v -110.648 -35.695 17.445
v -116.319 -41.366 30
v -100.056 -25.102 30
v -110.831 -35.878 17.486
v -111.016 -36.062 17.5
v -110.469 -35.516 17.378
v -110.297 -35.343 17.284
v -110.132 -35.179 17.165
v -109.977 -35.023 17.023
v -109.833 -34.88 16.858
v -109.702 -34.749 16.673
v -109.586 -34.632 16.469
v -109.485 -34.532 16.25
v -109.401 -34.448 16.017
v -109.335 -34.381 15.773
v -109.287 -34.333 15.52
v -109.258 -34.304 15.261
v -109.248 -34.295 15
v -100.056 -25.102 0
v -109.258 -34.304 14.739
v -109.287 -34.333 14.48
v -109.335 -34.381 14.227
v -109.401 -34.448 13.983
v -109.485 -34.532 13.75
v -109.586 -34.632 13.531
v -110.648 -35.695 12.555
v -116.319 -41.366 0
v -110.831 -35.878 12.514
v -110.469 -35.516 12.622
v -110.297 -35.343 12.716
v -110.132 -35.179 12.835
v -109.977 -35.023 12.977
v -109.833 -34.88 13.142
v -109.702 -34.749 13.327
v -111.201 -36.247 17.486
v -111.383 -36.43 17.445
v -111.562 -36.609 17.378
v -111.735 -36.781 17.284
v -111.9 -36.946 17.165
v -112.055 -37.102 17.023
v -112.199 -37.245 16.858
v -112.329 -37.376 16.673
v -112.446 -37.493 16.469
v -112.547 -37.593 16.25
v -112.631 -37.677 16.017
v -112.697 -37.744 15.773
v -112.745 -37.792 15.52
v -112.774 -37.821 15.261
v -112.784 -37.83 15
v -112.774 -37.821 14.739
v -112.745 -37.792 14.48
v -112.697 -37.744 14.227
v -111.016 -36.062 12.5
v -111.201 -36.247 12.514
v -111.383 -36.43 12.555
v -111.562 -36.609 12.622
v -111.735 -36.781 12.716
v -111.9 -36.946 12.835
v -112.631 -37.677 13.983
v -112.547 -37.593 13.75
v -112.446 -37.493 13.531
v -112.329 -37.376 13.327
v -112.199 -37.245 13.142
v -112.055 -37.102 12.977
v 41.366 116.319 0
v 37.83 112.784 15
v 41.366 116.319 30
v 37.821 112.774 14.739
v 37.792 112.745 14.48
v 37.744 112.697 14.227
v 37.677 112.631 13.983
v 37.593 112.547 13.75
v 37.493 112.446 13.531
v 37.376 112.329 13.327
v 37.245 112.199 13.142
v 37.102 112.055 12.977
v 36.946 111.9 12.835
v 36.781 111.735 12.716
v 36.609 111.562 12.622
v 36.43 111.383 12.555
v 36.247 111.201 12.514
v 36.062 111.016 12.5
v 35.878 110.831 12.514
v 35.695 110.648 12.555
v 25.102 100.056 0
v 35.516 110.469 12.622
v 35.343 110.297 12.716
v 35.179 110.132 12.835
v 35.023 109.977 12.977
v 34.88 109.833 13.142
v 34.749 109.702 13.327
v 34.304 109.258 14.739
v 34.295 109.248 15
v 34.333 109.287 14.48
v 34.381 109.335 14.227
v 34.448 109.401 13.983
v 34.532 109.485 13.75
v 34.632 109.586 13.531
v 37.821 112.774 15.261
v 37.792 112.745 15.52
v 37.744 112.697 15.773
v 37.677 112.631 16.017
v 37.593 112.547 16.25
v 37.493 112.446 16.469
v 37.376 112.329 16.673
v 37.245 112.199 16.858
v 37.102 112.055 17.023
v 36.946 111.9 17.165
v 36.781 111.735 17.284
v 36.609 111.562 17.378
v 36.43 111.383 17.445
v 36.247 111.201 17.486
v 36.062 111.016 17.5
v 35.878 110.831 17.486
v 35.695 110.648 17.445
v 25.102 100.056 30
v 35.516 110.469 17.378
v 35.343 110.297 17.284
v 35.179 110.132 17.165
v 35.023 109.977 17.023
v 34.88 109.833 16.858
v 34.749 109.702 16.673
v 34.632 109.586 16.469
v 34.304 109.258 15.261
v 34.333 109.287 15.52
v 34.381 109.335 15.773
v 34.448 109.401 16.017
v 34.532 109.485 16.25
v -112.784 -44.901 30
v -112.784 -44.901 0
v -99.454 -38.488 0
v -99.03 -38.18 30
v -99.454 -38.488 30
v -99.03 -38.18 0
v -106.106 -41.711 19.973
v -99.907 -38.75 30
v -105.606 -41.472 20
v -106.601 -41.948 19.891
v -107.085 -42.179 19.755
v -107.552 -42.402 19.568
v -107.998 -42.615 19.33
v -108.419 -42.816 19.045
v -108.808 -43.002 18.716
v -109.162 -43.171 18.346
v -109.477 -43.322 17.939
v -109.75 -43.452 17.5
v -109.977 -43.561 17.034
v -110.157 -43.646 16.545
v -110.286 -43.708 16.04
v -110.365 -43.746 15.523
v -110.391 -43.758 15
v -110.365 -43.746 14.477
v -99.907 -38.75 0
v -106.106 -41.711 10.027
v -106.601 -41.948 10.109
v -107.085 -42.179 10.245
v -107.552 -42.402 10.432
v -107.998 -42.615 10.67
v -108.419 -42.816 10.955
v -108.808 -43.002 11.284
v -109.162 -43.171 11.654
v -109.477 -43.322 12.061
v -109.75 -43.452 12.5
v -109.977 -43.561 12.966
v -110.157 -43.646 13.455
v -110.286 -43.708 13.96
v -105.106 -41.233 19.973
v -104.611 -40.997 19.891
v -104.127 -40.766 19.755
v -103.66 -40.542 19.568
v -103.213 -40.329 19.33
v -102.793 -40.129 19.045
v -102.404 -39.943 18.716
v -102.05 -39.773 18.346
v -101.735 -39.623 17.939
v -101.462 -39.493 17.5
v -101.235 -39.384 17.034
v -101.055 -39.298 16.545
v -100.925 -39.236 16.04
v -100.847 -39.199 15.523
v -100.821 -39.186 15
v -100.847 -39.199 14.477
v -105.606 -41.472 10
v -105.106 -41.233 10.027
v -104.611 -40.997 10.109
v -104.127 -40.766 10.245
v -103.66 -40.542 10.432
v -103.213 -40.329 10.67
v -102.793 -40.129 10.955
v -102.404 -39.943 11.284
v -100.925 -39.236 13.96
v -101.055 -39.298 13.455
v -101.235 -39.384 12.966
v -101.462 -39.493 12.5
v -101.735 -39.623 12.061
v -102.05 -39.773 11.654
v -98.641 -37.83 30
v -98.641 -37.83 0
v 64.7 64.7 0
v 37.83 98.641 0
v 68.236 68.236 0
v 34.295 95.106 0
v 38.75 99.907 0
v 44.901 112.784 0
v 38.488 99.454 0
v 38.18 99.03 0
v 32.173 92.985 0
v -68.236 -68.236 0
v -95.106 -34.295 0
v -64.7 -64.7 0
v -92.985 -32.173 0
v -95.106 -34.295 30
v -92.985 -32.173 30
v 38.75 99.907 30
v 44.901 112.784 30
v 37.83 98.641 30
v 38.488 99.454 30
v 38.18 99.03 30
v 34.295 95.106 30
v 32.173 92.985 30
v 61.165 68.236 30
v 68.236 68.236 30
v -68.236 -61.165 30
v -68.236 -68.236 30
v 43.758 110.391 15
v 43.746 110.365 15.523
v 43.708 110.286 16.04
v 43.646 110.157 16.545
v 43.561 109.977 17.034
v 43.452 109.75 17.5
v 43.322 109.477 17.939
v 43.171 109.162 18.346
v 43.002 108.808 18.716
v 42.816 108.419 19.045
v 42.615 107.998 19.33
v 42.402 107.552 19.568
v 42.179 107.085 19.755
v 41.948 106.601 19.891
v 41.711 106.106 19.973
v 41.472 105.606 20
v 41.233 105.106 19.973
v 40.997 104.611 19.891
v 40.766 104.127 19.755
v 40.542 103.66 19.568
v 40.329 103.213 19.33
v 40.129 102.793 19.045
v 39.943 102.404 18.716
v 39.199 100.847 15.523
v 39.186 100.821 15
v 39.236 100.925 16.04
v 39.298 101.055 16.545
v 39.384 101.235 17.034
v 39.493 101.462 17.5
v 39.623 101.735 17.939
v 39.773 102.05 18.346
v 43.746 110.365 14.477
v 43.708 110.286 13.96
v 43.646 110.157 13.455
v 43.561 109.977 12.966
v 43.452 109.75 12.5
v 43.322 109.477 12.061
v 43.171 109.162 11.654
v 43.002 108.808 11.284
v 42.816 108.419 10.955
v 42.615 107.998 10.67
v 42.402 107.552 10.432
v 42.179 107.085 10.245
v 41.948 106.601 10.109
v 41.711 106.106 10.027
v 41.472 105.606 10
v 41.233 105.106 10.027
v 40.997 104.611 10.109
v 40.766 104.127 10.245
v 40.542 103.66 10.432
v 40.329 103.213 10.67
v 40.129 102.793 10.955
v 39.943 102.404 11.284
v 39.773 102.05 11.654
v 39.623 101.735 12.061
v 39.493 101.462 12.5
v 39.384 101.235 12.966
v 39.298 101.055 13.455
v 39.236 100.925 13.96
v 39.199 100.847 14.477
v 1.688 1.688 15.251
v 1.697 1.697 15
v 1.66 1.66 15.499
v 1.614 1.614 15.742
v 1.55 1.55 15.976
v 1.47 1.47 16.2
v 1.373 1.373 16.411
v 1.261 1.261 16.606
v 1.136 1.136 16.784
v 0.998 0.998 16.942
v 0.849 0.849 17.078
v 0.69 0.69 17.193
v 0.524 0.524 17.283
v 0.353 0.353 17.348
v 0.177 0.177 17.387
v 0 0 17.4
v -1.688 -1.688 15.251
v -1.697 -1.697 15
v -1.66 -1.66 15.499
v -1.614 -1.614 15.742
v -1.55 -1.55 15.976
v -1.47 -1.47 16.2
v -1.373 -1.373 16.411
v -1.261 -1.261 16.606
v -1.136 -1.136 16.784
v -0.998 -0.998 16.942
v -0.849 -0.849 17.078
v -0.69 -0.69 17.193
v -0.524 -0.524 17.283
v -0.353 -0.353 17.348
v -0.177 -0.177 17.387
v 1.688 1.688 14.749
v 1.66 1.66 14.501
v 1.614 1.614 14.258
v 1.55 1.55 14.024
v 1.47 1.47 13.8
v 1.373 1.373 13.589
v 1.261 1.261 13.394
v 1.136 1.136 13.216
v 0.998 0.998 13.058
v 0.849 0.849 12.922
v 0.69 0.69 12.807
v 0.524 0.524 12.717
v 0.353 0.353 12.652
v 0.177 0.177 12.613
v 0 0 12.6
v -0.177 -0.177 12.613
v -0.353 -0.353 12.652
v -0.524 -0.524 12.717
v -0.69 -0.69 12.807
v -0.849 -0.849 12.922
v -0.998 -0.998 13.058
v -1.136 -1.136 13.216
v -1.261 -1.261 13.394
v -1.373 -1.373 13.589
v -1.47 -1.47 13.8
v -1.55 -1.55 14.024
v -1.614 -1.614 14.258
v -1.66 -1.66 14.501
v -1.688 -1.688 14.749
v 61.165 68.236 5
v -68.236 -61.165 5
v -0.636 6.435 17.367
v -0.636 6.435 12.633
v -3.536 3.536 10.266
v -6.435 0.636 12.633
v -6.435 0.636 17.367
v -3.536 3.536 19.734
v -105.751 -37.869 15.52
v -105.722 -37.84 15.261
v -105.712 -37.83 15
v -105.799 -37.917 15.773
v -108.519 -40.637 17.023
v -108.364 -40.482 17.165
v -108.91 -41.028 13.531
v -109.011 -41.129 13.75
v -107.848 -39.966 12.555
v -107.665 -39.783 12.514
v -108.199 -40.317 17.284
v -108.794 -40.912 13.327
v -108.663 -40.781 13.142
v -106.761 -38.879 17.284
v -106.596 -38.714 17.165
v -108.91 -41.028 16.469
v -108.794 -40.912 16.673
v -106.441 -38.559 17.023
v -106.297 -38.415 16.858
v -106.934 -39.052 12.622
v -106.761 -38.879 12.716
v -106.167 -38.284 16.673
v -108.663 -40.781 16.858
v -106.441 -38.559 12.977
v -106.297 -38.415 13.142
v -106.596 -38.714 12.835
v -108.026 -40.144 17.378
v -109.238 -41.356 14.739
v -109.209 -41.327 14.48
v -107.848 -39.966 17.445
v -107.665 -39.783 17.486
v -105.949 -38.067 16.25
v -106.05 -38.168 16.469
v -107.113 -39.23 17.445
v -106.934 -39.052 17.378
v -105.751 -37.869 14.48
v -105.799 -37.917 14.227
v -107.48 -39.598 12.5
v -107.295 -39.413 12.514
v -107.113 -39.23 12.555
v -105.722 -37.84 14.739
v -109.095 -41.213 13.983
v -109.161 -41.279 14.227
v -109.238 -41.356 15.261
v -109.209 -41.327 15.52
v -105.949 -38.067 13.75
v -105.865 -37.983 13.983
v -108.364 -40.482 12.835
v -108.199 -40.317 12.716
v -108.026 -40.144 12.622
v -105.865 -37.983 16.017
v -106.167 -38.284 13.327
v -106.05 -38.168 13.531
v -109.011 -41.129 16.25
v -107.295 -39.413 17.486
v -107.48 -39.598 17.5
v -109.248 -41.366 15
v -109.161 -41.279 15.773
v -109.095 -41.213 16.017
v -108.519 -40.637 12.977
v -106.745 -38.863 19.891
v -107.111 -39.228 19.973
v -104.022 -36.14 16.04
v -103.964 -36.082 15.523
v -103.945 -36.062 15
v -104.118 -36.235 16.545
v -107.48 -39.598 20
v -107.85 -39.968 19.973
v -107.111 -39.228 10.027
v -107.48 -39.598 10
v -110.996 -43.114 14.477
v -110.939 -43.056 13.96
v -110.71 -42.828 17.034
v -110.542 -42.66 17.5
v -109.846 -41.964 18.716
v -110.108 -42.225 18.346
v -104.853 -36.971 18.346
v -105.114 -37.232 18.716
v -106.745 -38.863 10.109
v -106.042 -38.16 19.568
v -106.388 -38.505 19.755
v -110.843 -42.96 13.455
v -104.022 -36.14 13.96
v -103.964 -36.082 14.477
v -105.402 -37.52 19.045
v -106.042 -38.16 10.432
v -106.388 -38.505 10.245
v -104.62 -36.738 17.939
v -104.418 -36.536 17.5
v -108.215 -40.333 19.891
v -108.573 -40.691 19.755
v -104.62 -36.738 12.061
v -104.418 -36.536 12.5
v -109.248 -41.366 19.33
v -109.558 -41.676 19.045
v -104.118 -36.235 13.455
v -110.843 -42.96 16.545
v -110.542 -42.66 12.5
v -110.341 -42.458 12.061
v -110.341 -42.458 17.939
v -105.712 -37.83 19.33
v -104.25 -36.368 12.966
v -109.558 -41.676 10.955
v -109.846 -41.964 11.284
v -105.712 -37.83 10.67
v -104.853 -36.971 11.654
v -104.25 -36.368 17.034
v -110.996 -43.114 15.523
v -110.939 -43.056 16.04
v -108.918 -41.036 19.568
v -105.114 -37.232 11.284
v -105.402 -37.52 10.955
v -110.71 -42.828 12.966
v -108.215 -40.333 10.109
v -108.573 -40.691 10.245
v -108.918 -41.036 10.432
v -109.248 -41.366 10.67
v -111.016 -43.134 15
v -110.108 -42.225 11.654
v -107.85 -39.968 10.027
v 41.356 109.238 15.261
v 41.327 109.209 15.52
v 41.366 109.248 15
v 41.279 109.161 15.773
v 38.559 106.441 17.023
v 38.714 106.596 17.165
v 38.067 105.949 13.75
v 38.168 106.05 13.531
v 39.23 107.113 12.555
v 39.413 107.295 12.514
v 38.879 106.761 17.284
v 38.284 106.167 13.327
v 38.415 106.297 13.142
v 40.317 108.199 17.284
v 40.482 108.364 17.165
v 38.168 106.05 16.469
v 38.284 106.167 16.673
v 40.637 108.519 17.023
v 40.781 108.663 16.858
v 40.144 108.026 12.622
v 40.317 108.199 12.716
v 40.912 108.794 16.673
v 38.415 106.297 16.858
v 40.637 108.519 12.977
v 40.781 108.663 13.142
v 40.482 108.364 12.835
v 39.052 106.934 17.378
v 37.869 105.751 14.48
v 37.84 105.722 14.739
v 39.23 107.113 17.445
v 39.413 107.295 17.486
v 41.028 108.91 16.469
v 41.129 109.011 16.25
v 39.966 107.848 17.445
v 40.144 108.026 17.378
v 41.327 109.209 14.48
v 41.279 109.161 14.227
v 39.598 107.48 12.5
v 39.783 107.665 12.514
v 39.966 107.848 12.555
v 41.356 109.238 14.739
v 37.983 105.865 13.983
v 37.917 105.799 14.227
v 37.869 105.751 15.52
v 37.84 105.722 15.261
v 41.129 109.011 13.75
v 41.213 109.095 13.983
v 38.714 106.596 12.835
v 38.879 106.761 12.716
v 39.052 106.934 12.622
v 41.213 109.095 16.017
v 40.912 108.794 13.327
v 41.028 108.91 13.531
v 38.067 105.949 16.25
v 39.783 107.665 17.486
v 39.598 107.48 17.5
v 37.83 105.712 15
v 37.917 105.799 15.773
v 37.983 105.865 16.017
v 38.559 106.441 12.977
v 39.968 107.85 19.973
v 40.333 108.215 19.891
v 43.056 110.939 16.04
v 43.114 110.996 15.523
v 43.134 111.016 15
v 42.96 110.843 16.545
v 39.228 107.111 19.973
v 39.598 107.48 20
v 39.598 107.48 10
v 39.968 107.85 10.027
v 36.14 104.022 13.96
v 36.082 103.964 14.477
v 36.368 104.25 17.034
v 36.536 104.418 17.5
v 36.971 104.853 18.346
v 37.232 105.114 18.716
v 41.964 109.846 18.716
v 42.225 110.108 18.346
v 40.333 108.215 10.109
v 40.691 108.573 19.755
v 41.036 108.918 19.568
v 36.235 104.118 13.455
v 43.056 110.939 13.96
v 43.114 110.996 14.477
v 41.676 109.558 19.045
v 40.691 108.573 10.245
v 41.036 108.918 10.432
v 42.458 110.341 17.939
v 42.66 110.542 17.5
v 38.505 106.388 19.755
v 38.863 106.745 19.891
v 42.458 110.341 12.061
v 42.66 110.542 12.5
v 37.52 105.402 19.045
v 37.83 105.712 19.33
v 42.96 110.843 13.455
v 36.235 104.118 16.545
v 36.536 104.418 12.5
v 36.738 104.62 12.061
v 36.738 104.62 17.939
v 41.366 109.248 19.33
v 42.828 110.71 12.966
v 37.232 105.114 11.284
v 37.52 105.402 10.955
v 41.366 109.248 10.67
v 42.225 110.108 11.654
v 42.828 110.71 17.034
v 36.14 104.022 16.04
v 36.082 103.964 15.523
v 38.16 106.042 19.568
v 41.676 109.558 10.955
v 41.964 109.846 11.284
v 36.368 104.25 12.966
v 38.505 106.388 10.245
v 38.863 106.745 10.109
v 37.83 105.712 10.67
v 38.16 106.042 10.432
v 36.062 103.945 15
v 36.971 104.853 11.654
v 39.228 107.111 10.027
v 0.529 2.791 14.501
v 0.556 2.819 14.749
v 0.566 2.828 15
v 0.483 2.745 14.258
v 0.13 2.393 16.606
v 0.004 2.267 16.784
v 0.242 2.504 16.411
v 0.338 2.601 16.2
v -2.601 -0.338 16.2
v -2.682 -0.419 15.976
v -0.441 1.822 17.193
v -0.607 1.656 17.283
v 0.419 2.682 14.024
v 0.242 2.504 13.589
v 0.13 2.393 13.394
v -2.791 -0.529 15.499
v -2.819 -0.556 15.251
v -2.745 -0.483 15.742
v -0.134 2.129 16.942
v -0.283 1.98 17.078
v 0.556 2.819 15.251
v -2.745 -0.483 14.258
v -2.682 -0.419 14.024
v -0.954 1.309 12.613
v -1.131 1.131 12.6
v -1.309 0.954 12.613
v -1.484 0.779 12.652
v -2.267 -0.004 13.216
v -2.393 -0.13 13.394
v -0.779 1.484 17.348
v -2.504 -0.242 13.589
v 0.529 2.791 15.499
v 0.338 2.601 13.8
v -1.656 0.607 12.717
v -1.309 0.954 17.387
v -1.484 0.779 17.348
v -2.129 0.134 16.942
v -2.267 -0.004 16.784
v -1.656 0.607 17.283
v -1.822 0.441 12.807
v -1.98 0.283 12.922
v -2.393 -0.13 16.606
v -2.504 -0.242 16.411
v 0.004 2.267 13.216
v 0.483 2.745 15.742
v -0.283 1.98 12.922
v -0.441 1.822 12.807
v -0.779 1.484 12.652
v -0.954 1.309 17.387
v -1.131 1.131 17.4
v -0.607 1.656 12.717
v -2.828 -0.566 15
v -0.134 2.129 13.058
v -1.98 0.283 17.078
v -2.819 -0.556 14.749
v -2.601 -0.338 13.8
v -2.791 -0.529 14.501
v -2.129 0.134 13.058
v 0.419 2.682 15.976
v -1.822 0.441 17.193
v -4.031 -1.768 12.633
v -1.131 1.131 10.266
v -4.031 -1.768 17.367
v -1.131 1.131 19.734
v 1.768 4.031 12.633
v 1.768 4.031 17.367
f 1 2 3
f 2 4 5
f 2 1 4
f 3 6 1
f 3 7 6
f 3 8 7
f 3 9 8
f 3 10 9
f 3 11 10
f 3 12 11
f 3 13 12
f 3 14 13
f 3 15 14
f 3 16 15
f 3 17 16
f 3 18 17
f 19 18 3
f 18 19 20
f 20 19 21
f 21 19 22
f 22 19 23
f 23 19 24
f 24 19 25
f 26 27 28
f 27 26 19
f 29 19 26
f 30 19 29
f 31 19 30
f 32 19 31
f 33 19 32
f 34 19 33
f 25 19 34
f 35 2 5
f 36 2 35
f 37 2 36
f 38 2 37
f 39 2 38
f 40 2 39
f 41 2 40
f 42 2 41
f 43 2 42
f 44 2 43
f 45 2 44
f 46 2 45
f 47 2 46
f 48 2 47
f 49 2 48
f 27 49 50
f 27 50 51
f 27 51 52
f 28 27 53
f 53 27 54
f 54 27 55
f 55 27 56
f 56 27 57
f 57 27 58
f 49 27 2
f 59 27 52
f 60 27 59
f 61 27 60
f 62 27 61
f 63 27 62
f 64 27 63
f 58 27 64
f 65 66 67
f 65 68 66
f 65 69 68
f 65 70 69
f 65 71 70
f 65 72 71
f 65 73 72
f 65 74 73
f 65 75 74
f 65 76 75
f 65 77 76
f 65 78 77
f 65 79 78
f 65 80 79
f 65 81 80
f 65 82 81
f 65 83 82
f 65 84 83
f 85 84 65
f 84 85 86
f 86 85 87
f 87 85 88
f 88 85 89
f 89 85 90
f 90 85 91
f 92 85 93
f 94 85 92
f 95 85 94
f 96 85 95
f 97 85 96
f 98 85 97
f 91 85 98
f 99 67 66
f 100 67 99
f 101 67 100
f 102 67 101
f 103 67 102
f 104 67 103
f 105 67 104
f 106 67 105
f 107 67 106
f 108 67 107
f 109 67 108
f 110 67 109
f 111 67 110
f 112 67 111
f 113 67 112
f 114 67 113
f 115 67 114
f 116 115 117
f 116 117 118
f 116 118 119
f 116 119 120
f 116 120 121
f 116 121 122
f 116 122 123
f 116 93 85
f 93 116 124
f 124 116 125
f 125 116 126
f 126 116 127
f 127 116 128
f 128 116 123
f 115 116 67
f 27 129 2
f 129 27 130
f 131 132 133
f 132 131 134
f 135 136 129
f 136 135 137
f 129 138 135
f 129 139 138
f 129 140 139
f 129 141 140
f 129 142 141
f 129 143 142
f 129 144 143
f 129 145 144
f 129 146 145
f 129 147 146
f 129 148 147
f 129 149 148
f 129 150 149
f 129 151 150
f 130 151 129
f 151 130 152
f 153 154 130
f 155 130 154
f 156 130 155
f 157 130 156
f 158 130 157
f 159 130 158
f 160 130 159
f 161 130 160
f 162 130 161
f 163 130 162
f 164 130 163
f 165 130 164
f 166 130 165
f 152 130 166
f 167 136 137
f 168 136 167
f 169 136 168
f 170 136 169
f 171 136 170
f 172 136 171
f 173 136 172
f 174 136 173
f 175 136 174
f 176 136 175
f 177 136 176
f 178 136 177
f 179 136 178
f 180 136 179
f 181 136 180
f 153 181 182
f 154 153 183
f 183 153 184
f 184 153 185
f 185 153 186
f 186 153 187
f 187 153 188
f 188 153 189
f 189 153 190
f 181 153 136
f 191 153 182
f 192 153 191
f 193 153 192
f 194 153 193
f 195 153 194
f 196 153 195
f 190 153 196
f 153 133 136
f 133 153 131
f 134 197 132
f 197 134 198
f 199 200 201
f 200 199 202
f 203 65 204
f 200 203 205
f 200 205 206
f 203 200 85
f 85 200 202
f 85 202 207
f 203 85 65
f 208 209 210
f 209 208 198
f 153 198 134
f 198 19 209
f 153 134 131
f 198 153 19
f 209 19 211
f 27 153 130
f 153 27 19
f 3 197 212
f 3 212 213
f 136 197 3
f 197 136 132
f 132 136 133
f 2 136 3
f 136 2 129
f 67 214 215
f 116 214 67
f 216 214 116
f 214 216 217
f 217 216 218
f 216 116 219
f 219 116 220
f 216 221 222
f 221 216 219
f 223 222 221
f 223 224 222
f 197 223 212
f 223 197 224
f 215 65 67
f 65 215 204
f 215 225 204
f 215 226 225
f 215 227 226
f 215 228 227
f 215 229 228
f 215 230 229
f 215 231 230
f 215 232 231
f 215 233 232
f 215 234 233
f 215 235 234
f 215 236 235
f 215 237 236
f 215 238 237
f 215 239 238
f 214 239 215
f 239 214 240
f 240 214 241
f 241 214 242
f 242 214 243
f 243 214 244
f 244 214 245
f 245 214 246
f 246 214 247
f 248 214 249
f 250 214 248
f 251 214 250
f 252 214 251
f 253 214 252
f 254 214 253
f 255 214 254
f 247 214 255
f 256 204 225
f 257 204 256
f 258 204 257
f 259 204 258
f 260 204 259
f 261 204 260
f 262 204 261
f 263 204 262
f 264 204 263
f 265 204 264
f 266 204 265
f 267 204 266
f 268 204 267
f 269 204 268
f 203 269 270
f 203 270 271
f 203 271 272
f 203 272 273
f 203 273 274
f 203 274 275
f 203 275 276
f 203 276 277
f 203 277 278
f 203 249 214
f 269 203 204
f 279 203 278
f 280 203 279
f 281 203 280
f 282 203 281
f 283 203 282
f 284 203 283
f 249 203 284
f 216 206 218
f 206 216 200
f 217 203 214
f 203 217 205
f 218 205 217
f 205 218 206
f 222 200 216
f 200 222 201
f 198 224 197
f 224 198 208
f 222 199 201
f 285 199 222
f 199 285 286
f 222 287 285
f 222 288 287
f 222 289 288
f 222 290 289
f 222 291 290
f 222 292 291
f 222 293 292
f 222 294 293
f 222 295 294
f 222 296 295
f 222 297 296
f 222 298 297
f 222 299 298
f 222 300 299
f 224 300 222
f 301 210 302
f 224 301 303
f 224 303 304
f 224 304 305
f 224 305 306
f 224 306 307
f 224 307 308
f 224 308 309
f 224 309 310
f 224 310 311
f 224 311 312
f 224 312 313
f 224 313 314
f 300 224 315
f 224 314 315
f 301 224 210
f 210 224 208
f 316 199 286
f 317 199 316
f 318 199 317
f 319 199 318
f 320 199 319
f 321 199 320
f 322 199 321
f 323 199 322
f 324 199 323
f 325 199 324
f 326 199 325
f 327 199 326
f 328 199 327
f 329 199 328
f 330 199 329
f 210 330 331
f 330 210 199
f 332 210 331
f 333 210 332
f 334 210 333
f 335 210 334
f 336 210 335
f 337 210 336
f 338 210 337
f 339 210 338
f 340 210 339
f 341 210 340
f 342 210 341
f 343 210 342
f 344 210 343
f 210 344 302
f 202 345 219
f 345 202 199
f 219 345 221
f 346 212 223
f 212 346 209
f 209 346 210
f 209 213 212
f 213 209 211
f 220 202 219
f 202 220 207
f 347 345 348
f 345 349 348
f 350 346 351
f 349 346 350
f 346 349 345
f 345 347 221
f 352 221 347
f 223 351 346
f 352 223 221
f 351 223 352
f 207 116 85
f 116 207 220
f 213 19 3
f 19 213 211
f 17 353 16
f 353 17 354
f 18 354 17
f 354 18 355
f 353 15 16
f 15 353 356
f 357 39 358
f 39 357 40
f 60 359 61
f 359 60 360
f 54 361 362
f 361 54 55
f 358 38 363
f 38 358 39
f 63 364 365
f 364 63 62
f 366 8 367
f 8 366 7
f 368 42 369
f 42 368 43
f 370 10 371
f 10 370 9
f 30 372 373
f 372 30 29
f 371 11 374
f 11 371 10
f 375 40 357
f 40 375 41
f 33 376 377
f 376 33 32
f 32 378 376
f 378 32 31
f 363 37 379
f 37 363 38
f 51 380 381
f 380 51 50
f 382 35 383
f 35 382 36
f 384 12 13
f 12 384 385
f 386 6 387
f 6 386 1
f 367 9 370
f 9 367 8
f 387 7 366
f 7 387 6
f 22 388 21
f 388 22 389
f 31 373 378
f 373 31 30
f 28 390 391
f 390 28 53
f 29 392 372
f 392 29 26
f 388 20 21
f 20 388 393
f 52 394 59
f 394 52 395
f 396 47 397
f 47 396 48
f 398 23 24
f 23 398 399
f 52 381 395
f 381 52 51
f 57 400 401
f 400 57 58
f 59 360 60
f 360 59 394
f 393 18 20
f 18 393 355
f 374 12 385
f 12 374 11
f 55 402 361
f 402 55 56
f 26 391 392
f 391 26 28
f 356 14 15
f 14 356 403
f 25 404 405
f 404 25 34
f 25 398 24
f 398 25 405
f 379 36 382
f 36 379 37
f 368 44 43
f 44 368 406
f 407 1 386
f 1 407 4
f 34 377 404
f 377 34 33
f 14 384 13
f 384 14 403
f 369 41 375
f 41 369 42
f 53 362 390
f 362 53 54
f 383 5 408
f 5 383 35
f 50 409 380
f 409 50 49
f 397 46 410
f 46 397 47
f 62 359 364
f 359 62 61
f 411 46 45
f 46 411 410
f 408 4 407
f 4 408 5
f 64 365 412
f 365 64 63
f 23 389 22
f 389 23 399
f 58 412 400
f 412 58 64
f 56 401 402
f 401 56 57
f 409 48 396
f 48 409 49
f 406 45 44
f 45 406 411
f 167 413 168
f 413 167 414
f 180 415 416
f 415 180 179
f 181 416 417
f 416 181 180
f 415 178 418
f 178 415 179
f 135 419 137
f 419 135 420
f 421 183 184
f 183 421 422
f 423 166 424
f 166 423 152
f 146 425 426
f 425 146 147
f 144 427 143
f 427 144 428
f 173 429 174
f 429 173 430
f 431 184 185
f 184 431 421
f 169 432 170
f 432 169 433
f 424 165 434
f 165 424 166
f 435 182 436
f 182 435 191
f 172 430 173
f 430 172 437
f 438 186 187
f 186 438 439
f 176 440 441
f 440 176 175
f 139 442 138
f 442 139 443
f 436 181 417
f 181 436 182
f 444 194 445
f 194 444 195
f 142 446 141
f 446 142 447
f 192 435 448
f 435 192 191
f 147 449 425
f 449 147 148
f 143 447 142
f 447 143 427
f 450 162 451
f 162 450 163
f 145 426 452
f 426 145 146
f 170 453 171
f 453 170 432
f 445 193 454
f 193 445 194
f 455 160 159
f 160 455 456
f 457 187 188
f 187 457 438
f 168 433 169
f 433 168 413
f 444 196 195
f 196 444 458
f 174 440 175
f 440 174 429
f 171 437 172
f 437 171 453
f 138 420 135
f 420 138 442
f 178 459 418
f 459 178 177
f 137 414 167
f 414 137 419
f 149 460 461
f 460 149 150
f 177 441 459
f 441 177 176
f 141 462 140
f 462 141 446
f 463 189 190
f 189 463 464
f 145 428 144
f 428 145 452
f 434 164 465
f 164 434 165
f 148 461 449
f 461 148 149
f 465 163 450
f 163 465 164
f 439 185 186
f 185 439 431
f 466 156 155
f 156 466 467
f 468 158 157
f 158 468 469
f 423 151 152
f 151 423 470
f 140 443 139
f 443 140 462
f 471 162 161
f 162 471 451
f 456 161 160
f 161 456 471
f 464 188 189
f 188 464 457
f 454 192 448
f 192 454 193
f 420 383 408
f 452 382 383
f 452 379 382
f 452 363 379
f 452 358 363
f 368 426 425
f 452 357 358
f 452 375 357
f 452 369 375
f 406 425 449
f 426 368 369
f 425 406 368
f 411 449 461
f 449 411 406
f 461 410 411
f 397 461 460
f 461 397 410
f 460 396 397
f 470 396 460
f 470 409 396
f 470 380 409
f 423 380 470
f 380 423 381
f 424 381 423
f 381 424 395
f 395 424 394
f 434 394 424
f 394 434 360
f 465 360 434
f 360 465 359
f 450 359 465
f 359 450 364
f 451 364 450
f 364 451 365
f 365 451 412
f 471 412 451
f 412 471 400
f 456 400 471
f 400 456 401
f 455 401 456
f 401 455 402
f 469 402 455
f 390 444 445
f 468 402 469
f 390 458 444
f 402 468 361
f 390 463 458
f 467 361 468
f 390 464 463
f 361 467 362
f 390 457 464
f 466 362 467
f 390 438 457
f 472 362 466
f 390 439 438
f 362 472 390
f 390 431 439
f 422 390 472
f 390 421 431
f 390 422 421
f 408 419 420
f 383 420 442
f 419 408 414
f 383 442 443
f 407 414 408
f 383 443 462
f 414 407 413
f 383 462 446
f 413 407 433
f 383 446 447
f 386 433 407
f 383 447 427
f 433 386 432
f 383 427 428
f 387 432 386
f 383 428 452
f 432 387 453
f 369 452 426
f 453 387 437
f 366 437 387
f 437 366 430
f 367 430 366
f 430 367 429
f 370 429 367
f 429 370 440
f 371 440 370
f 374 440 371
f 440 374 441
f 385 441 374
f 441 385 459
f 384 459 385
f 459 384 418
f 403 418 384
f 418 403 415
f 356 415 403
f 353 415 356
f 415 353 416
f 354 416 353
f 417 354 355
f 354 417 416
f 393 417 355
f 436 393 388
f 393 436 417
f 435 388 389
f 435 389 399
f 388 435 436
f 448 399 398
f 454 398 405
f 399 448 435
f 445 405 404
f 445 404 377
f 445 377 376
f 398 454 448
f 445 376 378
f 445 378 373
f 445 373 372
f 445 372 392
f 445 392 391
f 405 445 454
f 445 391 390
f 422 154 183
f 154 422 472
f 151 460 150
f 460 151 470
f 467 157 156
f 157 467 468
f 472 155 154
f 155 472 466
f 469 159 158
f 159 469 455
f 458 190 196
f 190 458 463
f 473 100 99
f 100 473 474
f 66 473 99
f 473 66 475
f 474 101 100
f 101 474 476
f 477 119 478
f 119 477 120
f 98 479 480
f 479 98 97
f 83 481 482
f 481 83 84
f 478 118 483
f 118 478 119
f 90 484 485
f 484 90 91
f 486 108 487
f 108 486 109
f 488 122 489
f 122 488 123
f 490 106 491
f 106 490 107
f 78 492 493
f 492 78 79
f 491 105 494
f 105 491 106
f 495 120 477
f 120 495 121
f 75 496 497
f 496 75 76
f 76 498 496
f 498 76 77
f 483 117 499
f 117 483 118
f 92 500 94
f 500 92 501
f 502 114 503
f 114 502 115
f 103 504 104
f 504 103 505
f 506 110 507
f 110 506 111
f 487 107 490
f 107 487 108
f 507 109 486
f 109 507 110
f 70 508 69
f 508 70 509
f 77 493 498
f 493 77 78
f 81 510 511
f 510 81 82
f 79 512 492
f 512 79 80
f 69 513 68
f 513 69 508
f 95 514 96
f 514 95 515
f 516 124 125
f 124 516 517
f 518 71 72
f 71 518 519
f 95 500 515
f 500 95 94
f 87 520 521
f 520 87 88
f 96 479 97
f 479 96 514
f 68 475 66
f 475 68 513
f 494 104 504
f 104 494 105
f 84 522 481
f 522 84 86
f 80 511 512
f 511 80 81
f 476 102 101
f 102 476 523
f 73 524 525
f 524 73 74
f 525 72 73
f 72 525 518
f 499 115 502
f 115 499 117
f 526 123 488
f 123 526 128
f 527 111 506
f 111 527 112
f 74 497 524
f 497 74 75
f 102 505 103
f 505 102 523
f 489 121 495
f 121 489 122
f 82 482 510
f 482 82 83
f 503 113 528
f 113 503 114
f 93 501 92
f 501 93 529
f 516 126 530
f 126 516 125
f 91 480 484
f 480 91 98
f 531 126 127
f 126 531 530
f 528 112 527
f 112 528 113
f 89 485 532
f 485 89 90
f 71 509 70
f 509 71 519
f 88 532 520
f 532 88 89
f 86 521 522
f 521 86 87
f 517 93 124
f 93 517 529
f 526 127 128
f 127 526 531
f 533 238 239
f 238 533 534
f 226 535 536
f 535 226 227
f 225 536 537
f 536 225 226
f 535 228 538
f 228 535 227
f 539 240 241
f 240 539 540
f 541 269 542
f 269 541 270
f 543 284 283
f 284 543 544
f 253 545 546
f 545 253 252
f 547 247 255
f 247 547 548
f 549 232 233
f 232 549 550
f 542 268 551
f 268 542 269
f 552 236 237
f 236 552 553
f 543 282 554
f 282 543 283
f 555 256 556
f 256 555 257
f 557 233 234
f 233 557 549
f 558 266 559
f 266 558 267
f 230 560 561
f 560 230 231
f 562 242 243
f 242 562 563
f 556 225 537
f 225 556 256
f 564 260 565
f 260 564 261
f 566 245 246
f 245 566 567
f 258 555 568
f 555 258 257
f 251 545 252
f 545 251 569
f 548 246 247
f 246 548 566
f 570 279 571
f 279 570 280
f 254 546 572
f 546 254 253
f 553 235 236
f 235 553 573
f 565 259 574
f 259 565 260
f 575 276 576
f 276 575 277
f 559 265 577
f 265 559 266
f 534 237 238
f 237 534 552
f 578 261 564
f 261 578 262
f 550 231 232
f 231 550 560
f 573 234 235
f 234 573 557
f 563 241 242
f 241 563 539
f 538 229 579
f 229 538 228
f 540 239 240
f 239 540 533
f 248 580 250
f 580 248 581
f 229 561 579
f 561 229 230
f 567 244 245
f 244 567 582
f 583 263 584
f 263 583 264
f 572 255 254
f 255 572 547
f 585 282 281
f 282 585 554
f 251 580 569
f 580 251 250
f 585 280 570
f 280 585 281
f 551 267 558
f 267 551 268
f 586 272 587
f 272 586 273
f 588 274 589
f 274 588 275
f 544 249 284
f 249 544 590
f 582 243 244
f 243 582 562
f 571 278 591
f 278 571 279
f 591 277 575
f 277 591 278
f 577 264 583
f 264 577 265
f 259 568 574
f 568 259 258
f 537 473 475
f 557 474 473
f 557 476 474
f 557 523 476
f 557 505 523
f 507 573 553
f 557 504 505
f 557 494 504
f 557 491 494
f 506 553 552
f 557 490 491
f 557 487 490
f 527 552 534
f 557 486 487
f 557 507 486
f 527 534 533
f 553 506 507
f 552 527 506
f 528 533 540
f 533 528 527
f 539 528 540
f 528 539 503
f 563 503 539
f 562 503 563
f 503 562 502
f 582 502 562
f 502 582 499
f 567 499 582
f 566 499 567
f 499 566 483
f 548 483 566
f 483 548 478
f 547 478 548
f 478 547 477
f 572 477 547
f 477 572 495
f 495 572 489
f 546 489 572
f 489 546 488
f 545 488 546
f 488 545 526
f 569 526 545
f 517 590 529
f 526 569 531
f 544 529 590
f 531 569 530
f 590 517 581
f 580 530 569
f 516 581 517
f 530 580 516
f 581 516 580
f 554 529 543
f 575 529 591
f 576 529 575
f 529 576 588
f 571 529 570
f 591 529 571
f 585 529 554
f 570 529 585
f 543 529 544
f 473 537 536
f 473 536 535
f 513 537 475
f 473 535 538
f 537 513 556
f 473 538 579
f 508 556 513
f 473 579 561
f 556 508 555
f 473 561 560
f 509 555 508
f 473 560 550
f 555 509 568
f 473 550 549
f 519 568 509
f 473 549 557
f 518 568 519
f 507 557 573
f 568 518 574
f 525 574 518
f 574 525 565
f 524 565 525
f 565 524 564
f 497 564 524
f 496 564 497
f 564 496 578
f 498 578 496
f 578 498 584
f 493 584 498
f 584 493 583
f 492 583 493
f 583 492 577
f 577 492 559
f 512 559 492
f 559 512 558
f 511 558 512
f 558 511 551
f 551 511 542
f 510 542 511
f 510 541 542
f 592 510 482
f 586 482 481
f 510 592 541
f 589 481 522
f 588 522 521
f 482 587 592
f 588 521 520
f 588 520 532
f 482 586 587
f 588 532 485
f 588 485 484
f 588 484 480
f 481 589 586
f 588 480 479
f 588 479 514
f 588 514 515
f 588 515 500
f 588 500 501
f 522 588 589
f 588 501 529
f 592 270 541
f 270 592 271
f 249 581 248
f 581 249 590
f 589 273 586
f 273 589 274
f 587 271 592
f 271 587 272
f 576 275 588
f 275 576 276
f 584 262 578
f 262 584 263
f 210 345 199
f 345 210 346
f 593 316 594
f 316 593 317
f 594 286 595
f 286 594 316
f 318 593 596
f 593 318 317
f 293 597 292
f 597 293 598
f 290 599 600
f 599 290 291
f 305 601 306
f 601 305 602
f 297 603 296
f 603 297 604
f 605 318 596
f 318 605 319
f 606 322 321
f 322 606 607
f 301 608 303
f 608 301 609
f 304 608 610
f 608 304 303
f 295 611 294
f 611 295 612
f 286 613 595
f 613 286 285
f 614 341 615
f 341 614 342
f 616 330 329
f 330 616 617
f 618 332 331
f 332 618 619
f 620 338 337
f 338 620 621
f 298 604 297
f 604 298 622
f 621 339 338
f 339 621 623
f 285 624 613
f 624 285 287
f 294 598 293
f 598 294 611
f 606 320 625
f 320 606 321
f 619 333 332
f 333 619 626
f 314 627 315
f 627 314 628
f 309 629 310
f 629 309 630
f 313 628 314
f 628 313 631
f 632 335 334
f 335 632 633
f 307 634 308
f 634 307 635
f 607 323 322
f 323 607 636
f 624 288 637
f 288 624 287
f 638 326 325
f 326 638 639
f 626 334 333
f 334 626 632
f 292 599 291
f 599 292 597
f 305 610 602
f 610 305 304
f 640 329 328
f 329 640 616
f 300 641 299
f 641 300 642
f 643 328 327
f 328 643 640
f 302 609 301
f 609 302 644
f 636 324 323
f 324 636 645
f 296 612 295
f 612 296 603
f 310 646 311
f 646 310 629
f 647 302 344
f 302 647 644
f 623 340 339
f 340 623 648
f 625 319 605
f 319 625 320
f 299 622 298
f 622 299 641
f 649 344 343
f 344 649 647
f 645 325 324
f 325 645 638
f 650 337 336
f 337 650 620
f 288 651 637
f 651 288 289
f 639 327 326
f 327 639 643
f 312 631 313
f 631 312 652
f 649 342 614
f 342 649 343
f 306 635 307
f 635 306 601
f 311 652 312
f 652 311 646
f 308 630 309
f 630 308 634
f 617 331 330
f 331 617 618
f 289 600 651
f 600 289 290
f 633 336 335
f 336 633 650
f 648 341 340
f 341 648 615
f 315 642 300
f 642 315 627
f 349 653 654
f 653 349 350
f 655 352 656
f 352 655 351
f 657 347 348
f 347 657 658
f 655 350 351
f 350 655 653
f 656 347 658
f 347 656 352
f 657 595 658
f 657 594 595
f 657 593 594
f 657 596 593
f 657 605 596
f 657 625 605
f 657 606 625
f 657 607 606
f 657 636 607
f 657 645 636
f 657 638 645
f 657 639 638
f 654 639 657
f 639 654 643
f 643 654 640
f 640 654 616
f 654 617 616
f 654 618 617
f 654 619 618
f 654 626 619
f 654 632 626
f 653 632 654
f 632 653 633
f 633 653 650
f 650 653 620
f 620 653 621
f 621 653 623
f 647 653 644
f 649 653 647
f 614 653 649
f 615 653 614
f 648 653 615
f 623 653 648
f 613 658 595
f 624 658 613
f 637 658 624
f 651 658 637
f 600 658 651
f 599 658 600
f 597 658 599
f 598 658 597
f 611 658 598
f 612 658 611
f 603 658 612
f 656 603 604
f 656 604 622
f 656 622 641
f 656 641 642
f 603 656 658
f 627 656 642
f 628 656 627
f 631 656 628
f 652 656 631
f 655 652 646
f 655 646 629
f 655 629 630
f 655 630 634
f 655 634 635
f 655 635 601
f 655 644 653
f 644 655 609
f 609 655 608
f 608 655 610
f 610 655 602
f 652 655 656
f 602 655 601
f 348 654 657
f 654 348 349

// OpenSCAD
// Lenovo ThinkCentre Tiny Series Under-desk Mount
// Designed for 180mm x 180mm print beds (Must print diagonally!)
//
// Print it twice. Inset M4 nut into the retaining holdes.
// Mount the brackets, use a thumbscrew or grubscrew to secure.
//
// Print on its side, else you're going to find you're Tiny on the floor.


/* [Printer Settings] */
// To fit 180mm bed, we rotate the part 45 degrees
rotate_for_print = true; 

/* [PC Dimensions] */
// Width of the PC (usually ~179mm-182mm for Tiny series)
pc_width = 183.0; // Added 1mm tolerance
// Height/Thickness of the PC (usually ~37mm)
pc_height = 38.0; // Added 1mm tolerance

/* [Bracket Dimensions] */
// Depth of a single bracket (Z-axis height during print)
bracket_depth = 30; 
// Thickness of the walls
wall_thick = 5;
// Width of the mounting tabs
tab_width = 15;
// Clearance between the top of the PC and the desk surface
airflow_gap = 10;
// Width of the retaining clips/rails that hold the PC down
retainer_clip_width = 3.0;

/* [Security] */
// Diameter of the locking screw hole (M5 = 5.2, M4 = 4.2)
screw_hole_dia = 4.8; 
// Size of the nut trap (0 to disable nut trap)
nut_trap_width = 8.2; // Standard M5 nut is ~8mm flat-to-flat
nut_trap_depth = 3.5;

/* [Hidden] */
$fn = 60;

module main_body() {
    total_width = pc_width + (wall_thick * 2);
    // Total height now includes the bottom wall, the PC, and the airflow gap
    total_height = pc_height + wall_thick + airflow_gap; 
    
    difference() {
        // Outer Shell
        union() {
            // Main U-Shape
            translate([-total_width/2, 0, 0])
            cube([total_width, total_height, bracket_depth]);
            
            // Mounting Tabs (Ears)
            for (i = [-1, 1]) {
                translate([(i * (total_width/2 + tab_width/2)), total_height - wall_thick/2, bracket_depth/2])
                hull() {
                    cube([tab_width, wall_thick, bracket_depth], center=true);
                    // Fillet to main body
                    // Shifted down (-wall_thick/2) so the top of the cylinder is flush with the top of the tab
                    translate([-i * tab_width/2, -wall_thick/2, 0])
                    cylinder(r=wall_thick, h=bracket_depth, center=true);
                }
            }
        }

        // Inner Cutout (Stepped Profile)
        union() {
            // 1. The PC Slot (Wide bottom section)
            translate([-pc_width/2, wall_thick, -1])
            cube([pc_width, pc_height, bracket_depth + 2]);
            
            // 2. The Airflow Gap (Narrower top section to create retaining clips)
            // The slot narrows by retainer_clip_width on both sides
            translate([-(pc_width - 2*retainer_clip_width)/2, wall_thick + pc_height - 0.1, -1])
            cube([pc_width - 2*retainer_clip_width, airflow_gap + 10, bracket_depth + 2]);
        }
        
        // Chamfers (Bevels) for smooth insertion
        
        // 1. Bottom Floor Chamfer (Existing)
        translate([-pc_width/2, wall_thick-10, -5])
        rotate([-45, 0, 0])
        cube([pc_width, 5, bracket_depth + 10]);

        // 2. Top Retaining Clip Chamfer (New)
        // Bevels the underside of the retaining rails
        translate([-pc_width/2, wall_thick + pc_height + 10 - 2, -5])
        rotate([-135, 0, 0]) // Angles the cut to slope the ceiling entry
        cube([pc_width, 5, bracket_depth + 10]);

        // Mounting Screw Holes (Countersunk)
        for (i = [-1, 1]) {
            translate([(i * (total_width/2 + tab_width/2)), total_height + 5, bracket_depth/2])
            rotate([90, 0, 0]) {
                cylinder(d=5, h=20); // Screw shaft
                translate([0, 0, 5 + wall_thick])
                cylinder(d=10, h=10); // Screw head clearance
            }
        }
        
        // Security/Locking Screw Hole (Bottom Center)
        translate([0, -1, bracket_depth/2])
        rotate([-90, 0, 0])
        cylinder(d=screw_hole_dia, h=wall_thick + 10);
        
        // Hex Nut Trap (Optional)
        if (nut_trap_width > 0) {
            translate([0, wall_thick - nut_trap_depth + 0.1, bracket_depth/2])
            rotate([-90, 90, 0])
            cylinder(r=nut_trap_width/2 / cos(30), h=nut_trap_depth + 1, $fn=6);
        }
    }
}

// Positioning logic
if (rotate_for_print) {
    // Rotates 45 degrees to fit diagonal of 180mm bed
    // (180^2 + 180^2)^0.5 = ~254mm diagonal space
    // Part width is approx 183 + 10 + 30 = ~223mm
    rotate([0, 0, 45])
    main_body();
} else {
    main_body();
}
